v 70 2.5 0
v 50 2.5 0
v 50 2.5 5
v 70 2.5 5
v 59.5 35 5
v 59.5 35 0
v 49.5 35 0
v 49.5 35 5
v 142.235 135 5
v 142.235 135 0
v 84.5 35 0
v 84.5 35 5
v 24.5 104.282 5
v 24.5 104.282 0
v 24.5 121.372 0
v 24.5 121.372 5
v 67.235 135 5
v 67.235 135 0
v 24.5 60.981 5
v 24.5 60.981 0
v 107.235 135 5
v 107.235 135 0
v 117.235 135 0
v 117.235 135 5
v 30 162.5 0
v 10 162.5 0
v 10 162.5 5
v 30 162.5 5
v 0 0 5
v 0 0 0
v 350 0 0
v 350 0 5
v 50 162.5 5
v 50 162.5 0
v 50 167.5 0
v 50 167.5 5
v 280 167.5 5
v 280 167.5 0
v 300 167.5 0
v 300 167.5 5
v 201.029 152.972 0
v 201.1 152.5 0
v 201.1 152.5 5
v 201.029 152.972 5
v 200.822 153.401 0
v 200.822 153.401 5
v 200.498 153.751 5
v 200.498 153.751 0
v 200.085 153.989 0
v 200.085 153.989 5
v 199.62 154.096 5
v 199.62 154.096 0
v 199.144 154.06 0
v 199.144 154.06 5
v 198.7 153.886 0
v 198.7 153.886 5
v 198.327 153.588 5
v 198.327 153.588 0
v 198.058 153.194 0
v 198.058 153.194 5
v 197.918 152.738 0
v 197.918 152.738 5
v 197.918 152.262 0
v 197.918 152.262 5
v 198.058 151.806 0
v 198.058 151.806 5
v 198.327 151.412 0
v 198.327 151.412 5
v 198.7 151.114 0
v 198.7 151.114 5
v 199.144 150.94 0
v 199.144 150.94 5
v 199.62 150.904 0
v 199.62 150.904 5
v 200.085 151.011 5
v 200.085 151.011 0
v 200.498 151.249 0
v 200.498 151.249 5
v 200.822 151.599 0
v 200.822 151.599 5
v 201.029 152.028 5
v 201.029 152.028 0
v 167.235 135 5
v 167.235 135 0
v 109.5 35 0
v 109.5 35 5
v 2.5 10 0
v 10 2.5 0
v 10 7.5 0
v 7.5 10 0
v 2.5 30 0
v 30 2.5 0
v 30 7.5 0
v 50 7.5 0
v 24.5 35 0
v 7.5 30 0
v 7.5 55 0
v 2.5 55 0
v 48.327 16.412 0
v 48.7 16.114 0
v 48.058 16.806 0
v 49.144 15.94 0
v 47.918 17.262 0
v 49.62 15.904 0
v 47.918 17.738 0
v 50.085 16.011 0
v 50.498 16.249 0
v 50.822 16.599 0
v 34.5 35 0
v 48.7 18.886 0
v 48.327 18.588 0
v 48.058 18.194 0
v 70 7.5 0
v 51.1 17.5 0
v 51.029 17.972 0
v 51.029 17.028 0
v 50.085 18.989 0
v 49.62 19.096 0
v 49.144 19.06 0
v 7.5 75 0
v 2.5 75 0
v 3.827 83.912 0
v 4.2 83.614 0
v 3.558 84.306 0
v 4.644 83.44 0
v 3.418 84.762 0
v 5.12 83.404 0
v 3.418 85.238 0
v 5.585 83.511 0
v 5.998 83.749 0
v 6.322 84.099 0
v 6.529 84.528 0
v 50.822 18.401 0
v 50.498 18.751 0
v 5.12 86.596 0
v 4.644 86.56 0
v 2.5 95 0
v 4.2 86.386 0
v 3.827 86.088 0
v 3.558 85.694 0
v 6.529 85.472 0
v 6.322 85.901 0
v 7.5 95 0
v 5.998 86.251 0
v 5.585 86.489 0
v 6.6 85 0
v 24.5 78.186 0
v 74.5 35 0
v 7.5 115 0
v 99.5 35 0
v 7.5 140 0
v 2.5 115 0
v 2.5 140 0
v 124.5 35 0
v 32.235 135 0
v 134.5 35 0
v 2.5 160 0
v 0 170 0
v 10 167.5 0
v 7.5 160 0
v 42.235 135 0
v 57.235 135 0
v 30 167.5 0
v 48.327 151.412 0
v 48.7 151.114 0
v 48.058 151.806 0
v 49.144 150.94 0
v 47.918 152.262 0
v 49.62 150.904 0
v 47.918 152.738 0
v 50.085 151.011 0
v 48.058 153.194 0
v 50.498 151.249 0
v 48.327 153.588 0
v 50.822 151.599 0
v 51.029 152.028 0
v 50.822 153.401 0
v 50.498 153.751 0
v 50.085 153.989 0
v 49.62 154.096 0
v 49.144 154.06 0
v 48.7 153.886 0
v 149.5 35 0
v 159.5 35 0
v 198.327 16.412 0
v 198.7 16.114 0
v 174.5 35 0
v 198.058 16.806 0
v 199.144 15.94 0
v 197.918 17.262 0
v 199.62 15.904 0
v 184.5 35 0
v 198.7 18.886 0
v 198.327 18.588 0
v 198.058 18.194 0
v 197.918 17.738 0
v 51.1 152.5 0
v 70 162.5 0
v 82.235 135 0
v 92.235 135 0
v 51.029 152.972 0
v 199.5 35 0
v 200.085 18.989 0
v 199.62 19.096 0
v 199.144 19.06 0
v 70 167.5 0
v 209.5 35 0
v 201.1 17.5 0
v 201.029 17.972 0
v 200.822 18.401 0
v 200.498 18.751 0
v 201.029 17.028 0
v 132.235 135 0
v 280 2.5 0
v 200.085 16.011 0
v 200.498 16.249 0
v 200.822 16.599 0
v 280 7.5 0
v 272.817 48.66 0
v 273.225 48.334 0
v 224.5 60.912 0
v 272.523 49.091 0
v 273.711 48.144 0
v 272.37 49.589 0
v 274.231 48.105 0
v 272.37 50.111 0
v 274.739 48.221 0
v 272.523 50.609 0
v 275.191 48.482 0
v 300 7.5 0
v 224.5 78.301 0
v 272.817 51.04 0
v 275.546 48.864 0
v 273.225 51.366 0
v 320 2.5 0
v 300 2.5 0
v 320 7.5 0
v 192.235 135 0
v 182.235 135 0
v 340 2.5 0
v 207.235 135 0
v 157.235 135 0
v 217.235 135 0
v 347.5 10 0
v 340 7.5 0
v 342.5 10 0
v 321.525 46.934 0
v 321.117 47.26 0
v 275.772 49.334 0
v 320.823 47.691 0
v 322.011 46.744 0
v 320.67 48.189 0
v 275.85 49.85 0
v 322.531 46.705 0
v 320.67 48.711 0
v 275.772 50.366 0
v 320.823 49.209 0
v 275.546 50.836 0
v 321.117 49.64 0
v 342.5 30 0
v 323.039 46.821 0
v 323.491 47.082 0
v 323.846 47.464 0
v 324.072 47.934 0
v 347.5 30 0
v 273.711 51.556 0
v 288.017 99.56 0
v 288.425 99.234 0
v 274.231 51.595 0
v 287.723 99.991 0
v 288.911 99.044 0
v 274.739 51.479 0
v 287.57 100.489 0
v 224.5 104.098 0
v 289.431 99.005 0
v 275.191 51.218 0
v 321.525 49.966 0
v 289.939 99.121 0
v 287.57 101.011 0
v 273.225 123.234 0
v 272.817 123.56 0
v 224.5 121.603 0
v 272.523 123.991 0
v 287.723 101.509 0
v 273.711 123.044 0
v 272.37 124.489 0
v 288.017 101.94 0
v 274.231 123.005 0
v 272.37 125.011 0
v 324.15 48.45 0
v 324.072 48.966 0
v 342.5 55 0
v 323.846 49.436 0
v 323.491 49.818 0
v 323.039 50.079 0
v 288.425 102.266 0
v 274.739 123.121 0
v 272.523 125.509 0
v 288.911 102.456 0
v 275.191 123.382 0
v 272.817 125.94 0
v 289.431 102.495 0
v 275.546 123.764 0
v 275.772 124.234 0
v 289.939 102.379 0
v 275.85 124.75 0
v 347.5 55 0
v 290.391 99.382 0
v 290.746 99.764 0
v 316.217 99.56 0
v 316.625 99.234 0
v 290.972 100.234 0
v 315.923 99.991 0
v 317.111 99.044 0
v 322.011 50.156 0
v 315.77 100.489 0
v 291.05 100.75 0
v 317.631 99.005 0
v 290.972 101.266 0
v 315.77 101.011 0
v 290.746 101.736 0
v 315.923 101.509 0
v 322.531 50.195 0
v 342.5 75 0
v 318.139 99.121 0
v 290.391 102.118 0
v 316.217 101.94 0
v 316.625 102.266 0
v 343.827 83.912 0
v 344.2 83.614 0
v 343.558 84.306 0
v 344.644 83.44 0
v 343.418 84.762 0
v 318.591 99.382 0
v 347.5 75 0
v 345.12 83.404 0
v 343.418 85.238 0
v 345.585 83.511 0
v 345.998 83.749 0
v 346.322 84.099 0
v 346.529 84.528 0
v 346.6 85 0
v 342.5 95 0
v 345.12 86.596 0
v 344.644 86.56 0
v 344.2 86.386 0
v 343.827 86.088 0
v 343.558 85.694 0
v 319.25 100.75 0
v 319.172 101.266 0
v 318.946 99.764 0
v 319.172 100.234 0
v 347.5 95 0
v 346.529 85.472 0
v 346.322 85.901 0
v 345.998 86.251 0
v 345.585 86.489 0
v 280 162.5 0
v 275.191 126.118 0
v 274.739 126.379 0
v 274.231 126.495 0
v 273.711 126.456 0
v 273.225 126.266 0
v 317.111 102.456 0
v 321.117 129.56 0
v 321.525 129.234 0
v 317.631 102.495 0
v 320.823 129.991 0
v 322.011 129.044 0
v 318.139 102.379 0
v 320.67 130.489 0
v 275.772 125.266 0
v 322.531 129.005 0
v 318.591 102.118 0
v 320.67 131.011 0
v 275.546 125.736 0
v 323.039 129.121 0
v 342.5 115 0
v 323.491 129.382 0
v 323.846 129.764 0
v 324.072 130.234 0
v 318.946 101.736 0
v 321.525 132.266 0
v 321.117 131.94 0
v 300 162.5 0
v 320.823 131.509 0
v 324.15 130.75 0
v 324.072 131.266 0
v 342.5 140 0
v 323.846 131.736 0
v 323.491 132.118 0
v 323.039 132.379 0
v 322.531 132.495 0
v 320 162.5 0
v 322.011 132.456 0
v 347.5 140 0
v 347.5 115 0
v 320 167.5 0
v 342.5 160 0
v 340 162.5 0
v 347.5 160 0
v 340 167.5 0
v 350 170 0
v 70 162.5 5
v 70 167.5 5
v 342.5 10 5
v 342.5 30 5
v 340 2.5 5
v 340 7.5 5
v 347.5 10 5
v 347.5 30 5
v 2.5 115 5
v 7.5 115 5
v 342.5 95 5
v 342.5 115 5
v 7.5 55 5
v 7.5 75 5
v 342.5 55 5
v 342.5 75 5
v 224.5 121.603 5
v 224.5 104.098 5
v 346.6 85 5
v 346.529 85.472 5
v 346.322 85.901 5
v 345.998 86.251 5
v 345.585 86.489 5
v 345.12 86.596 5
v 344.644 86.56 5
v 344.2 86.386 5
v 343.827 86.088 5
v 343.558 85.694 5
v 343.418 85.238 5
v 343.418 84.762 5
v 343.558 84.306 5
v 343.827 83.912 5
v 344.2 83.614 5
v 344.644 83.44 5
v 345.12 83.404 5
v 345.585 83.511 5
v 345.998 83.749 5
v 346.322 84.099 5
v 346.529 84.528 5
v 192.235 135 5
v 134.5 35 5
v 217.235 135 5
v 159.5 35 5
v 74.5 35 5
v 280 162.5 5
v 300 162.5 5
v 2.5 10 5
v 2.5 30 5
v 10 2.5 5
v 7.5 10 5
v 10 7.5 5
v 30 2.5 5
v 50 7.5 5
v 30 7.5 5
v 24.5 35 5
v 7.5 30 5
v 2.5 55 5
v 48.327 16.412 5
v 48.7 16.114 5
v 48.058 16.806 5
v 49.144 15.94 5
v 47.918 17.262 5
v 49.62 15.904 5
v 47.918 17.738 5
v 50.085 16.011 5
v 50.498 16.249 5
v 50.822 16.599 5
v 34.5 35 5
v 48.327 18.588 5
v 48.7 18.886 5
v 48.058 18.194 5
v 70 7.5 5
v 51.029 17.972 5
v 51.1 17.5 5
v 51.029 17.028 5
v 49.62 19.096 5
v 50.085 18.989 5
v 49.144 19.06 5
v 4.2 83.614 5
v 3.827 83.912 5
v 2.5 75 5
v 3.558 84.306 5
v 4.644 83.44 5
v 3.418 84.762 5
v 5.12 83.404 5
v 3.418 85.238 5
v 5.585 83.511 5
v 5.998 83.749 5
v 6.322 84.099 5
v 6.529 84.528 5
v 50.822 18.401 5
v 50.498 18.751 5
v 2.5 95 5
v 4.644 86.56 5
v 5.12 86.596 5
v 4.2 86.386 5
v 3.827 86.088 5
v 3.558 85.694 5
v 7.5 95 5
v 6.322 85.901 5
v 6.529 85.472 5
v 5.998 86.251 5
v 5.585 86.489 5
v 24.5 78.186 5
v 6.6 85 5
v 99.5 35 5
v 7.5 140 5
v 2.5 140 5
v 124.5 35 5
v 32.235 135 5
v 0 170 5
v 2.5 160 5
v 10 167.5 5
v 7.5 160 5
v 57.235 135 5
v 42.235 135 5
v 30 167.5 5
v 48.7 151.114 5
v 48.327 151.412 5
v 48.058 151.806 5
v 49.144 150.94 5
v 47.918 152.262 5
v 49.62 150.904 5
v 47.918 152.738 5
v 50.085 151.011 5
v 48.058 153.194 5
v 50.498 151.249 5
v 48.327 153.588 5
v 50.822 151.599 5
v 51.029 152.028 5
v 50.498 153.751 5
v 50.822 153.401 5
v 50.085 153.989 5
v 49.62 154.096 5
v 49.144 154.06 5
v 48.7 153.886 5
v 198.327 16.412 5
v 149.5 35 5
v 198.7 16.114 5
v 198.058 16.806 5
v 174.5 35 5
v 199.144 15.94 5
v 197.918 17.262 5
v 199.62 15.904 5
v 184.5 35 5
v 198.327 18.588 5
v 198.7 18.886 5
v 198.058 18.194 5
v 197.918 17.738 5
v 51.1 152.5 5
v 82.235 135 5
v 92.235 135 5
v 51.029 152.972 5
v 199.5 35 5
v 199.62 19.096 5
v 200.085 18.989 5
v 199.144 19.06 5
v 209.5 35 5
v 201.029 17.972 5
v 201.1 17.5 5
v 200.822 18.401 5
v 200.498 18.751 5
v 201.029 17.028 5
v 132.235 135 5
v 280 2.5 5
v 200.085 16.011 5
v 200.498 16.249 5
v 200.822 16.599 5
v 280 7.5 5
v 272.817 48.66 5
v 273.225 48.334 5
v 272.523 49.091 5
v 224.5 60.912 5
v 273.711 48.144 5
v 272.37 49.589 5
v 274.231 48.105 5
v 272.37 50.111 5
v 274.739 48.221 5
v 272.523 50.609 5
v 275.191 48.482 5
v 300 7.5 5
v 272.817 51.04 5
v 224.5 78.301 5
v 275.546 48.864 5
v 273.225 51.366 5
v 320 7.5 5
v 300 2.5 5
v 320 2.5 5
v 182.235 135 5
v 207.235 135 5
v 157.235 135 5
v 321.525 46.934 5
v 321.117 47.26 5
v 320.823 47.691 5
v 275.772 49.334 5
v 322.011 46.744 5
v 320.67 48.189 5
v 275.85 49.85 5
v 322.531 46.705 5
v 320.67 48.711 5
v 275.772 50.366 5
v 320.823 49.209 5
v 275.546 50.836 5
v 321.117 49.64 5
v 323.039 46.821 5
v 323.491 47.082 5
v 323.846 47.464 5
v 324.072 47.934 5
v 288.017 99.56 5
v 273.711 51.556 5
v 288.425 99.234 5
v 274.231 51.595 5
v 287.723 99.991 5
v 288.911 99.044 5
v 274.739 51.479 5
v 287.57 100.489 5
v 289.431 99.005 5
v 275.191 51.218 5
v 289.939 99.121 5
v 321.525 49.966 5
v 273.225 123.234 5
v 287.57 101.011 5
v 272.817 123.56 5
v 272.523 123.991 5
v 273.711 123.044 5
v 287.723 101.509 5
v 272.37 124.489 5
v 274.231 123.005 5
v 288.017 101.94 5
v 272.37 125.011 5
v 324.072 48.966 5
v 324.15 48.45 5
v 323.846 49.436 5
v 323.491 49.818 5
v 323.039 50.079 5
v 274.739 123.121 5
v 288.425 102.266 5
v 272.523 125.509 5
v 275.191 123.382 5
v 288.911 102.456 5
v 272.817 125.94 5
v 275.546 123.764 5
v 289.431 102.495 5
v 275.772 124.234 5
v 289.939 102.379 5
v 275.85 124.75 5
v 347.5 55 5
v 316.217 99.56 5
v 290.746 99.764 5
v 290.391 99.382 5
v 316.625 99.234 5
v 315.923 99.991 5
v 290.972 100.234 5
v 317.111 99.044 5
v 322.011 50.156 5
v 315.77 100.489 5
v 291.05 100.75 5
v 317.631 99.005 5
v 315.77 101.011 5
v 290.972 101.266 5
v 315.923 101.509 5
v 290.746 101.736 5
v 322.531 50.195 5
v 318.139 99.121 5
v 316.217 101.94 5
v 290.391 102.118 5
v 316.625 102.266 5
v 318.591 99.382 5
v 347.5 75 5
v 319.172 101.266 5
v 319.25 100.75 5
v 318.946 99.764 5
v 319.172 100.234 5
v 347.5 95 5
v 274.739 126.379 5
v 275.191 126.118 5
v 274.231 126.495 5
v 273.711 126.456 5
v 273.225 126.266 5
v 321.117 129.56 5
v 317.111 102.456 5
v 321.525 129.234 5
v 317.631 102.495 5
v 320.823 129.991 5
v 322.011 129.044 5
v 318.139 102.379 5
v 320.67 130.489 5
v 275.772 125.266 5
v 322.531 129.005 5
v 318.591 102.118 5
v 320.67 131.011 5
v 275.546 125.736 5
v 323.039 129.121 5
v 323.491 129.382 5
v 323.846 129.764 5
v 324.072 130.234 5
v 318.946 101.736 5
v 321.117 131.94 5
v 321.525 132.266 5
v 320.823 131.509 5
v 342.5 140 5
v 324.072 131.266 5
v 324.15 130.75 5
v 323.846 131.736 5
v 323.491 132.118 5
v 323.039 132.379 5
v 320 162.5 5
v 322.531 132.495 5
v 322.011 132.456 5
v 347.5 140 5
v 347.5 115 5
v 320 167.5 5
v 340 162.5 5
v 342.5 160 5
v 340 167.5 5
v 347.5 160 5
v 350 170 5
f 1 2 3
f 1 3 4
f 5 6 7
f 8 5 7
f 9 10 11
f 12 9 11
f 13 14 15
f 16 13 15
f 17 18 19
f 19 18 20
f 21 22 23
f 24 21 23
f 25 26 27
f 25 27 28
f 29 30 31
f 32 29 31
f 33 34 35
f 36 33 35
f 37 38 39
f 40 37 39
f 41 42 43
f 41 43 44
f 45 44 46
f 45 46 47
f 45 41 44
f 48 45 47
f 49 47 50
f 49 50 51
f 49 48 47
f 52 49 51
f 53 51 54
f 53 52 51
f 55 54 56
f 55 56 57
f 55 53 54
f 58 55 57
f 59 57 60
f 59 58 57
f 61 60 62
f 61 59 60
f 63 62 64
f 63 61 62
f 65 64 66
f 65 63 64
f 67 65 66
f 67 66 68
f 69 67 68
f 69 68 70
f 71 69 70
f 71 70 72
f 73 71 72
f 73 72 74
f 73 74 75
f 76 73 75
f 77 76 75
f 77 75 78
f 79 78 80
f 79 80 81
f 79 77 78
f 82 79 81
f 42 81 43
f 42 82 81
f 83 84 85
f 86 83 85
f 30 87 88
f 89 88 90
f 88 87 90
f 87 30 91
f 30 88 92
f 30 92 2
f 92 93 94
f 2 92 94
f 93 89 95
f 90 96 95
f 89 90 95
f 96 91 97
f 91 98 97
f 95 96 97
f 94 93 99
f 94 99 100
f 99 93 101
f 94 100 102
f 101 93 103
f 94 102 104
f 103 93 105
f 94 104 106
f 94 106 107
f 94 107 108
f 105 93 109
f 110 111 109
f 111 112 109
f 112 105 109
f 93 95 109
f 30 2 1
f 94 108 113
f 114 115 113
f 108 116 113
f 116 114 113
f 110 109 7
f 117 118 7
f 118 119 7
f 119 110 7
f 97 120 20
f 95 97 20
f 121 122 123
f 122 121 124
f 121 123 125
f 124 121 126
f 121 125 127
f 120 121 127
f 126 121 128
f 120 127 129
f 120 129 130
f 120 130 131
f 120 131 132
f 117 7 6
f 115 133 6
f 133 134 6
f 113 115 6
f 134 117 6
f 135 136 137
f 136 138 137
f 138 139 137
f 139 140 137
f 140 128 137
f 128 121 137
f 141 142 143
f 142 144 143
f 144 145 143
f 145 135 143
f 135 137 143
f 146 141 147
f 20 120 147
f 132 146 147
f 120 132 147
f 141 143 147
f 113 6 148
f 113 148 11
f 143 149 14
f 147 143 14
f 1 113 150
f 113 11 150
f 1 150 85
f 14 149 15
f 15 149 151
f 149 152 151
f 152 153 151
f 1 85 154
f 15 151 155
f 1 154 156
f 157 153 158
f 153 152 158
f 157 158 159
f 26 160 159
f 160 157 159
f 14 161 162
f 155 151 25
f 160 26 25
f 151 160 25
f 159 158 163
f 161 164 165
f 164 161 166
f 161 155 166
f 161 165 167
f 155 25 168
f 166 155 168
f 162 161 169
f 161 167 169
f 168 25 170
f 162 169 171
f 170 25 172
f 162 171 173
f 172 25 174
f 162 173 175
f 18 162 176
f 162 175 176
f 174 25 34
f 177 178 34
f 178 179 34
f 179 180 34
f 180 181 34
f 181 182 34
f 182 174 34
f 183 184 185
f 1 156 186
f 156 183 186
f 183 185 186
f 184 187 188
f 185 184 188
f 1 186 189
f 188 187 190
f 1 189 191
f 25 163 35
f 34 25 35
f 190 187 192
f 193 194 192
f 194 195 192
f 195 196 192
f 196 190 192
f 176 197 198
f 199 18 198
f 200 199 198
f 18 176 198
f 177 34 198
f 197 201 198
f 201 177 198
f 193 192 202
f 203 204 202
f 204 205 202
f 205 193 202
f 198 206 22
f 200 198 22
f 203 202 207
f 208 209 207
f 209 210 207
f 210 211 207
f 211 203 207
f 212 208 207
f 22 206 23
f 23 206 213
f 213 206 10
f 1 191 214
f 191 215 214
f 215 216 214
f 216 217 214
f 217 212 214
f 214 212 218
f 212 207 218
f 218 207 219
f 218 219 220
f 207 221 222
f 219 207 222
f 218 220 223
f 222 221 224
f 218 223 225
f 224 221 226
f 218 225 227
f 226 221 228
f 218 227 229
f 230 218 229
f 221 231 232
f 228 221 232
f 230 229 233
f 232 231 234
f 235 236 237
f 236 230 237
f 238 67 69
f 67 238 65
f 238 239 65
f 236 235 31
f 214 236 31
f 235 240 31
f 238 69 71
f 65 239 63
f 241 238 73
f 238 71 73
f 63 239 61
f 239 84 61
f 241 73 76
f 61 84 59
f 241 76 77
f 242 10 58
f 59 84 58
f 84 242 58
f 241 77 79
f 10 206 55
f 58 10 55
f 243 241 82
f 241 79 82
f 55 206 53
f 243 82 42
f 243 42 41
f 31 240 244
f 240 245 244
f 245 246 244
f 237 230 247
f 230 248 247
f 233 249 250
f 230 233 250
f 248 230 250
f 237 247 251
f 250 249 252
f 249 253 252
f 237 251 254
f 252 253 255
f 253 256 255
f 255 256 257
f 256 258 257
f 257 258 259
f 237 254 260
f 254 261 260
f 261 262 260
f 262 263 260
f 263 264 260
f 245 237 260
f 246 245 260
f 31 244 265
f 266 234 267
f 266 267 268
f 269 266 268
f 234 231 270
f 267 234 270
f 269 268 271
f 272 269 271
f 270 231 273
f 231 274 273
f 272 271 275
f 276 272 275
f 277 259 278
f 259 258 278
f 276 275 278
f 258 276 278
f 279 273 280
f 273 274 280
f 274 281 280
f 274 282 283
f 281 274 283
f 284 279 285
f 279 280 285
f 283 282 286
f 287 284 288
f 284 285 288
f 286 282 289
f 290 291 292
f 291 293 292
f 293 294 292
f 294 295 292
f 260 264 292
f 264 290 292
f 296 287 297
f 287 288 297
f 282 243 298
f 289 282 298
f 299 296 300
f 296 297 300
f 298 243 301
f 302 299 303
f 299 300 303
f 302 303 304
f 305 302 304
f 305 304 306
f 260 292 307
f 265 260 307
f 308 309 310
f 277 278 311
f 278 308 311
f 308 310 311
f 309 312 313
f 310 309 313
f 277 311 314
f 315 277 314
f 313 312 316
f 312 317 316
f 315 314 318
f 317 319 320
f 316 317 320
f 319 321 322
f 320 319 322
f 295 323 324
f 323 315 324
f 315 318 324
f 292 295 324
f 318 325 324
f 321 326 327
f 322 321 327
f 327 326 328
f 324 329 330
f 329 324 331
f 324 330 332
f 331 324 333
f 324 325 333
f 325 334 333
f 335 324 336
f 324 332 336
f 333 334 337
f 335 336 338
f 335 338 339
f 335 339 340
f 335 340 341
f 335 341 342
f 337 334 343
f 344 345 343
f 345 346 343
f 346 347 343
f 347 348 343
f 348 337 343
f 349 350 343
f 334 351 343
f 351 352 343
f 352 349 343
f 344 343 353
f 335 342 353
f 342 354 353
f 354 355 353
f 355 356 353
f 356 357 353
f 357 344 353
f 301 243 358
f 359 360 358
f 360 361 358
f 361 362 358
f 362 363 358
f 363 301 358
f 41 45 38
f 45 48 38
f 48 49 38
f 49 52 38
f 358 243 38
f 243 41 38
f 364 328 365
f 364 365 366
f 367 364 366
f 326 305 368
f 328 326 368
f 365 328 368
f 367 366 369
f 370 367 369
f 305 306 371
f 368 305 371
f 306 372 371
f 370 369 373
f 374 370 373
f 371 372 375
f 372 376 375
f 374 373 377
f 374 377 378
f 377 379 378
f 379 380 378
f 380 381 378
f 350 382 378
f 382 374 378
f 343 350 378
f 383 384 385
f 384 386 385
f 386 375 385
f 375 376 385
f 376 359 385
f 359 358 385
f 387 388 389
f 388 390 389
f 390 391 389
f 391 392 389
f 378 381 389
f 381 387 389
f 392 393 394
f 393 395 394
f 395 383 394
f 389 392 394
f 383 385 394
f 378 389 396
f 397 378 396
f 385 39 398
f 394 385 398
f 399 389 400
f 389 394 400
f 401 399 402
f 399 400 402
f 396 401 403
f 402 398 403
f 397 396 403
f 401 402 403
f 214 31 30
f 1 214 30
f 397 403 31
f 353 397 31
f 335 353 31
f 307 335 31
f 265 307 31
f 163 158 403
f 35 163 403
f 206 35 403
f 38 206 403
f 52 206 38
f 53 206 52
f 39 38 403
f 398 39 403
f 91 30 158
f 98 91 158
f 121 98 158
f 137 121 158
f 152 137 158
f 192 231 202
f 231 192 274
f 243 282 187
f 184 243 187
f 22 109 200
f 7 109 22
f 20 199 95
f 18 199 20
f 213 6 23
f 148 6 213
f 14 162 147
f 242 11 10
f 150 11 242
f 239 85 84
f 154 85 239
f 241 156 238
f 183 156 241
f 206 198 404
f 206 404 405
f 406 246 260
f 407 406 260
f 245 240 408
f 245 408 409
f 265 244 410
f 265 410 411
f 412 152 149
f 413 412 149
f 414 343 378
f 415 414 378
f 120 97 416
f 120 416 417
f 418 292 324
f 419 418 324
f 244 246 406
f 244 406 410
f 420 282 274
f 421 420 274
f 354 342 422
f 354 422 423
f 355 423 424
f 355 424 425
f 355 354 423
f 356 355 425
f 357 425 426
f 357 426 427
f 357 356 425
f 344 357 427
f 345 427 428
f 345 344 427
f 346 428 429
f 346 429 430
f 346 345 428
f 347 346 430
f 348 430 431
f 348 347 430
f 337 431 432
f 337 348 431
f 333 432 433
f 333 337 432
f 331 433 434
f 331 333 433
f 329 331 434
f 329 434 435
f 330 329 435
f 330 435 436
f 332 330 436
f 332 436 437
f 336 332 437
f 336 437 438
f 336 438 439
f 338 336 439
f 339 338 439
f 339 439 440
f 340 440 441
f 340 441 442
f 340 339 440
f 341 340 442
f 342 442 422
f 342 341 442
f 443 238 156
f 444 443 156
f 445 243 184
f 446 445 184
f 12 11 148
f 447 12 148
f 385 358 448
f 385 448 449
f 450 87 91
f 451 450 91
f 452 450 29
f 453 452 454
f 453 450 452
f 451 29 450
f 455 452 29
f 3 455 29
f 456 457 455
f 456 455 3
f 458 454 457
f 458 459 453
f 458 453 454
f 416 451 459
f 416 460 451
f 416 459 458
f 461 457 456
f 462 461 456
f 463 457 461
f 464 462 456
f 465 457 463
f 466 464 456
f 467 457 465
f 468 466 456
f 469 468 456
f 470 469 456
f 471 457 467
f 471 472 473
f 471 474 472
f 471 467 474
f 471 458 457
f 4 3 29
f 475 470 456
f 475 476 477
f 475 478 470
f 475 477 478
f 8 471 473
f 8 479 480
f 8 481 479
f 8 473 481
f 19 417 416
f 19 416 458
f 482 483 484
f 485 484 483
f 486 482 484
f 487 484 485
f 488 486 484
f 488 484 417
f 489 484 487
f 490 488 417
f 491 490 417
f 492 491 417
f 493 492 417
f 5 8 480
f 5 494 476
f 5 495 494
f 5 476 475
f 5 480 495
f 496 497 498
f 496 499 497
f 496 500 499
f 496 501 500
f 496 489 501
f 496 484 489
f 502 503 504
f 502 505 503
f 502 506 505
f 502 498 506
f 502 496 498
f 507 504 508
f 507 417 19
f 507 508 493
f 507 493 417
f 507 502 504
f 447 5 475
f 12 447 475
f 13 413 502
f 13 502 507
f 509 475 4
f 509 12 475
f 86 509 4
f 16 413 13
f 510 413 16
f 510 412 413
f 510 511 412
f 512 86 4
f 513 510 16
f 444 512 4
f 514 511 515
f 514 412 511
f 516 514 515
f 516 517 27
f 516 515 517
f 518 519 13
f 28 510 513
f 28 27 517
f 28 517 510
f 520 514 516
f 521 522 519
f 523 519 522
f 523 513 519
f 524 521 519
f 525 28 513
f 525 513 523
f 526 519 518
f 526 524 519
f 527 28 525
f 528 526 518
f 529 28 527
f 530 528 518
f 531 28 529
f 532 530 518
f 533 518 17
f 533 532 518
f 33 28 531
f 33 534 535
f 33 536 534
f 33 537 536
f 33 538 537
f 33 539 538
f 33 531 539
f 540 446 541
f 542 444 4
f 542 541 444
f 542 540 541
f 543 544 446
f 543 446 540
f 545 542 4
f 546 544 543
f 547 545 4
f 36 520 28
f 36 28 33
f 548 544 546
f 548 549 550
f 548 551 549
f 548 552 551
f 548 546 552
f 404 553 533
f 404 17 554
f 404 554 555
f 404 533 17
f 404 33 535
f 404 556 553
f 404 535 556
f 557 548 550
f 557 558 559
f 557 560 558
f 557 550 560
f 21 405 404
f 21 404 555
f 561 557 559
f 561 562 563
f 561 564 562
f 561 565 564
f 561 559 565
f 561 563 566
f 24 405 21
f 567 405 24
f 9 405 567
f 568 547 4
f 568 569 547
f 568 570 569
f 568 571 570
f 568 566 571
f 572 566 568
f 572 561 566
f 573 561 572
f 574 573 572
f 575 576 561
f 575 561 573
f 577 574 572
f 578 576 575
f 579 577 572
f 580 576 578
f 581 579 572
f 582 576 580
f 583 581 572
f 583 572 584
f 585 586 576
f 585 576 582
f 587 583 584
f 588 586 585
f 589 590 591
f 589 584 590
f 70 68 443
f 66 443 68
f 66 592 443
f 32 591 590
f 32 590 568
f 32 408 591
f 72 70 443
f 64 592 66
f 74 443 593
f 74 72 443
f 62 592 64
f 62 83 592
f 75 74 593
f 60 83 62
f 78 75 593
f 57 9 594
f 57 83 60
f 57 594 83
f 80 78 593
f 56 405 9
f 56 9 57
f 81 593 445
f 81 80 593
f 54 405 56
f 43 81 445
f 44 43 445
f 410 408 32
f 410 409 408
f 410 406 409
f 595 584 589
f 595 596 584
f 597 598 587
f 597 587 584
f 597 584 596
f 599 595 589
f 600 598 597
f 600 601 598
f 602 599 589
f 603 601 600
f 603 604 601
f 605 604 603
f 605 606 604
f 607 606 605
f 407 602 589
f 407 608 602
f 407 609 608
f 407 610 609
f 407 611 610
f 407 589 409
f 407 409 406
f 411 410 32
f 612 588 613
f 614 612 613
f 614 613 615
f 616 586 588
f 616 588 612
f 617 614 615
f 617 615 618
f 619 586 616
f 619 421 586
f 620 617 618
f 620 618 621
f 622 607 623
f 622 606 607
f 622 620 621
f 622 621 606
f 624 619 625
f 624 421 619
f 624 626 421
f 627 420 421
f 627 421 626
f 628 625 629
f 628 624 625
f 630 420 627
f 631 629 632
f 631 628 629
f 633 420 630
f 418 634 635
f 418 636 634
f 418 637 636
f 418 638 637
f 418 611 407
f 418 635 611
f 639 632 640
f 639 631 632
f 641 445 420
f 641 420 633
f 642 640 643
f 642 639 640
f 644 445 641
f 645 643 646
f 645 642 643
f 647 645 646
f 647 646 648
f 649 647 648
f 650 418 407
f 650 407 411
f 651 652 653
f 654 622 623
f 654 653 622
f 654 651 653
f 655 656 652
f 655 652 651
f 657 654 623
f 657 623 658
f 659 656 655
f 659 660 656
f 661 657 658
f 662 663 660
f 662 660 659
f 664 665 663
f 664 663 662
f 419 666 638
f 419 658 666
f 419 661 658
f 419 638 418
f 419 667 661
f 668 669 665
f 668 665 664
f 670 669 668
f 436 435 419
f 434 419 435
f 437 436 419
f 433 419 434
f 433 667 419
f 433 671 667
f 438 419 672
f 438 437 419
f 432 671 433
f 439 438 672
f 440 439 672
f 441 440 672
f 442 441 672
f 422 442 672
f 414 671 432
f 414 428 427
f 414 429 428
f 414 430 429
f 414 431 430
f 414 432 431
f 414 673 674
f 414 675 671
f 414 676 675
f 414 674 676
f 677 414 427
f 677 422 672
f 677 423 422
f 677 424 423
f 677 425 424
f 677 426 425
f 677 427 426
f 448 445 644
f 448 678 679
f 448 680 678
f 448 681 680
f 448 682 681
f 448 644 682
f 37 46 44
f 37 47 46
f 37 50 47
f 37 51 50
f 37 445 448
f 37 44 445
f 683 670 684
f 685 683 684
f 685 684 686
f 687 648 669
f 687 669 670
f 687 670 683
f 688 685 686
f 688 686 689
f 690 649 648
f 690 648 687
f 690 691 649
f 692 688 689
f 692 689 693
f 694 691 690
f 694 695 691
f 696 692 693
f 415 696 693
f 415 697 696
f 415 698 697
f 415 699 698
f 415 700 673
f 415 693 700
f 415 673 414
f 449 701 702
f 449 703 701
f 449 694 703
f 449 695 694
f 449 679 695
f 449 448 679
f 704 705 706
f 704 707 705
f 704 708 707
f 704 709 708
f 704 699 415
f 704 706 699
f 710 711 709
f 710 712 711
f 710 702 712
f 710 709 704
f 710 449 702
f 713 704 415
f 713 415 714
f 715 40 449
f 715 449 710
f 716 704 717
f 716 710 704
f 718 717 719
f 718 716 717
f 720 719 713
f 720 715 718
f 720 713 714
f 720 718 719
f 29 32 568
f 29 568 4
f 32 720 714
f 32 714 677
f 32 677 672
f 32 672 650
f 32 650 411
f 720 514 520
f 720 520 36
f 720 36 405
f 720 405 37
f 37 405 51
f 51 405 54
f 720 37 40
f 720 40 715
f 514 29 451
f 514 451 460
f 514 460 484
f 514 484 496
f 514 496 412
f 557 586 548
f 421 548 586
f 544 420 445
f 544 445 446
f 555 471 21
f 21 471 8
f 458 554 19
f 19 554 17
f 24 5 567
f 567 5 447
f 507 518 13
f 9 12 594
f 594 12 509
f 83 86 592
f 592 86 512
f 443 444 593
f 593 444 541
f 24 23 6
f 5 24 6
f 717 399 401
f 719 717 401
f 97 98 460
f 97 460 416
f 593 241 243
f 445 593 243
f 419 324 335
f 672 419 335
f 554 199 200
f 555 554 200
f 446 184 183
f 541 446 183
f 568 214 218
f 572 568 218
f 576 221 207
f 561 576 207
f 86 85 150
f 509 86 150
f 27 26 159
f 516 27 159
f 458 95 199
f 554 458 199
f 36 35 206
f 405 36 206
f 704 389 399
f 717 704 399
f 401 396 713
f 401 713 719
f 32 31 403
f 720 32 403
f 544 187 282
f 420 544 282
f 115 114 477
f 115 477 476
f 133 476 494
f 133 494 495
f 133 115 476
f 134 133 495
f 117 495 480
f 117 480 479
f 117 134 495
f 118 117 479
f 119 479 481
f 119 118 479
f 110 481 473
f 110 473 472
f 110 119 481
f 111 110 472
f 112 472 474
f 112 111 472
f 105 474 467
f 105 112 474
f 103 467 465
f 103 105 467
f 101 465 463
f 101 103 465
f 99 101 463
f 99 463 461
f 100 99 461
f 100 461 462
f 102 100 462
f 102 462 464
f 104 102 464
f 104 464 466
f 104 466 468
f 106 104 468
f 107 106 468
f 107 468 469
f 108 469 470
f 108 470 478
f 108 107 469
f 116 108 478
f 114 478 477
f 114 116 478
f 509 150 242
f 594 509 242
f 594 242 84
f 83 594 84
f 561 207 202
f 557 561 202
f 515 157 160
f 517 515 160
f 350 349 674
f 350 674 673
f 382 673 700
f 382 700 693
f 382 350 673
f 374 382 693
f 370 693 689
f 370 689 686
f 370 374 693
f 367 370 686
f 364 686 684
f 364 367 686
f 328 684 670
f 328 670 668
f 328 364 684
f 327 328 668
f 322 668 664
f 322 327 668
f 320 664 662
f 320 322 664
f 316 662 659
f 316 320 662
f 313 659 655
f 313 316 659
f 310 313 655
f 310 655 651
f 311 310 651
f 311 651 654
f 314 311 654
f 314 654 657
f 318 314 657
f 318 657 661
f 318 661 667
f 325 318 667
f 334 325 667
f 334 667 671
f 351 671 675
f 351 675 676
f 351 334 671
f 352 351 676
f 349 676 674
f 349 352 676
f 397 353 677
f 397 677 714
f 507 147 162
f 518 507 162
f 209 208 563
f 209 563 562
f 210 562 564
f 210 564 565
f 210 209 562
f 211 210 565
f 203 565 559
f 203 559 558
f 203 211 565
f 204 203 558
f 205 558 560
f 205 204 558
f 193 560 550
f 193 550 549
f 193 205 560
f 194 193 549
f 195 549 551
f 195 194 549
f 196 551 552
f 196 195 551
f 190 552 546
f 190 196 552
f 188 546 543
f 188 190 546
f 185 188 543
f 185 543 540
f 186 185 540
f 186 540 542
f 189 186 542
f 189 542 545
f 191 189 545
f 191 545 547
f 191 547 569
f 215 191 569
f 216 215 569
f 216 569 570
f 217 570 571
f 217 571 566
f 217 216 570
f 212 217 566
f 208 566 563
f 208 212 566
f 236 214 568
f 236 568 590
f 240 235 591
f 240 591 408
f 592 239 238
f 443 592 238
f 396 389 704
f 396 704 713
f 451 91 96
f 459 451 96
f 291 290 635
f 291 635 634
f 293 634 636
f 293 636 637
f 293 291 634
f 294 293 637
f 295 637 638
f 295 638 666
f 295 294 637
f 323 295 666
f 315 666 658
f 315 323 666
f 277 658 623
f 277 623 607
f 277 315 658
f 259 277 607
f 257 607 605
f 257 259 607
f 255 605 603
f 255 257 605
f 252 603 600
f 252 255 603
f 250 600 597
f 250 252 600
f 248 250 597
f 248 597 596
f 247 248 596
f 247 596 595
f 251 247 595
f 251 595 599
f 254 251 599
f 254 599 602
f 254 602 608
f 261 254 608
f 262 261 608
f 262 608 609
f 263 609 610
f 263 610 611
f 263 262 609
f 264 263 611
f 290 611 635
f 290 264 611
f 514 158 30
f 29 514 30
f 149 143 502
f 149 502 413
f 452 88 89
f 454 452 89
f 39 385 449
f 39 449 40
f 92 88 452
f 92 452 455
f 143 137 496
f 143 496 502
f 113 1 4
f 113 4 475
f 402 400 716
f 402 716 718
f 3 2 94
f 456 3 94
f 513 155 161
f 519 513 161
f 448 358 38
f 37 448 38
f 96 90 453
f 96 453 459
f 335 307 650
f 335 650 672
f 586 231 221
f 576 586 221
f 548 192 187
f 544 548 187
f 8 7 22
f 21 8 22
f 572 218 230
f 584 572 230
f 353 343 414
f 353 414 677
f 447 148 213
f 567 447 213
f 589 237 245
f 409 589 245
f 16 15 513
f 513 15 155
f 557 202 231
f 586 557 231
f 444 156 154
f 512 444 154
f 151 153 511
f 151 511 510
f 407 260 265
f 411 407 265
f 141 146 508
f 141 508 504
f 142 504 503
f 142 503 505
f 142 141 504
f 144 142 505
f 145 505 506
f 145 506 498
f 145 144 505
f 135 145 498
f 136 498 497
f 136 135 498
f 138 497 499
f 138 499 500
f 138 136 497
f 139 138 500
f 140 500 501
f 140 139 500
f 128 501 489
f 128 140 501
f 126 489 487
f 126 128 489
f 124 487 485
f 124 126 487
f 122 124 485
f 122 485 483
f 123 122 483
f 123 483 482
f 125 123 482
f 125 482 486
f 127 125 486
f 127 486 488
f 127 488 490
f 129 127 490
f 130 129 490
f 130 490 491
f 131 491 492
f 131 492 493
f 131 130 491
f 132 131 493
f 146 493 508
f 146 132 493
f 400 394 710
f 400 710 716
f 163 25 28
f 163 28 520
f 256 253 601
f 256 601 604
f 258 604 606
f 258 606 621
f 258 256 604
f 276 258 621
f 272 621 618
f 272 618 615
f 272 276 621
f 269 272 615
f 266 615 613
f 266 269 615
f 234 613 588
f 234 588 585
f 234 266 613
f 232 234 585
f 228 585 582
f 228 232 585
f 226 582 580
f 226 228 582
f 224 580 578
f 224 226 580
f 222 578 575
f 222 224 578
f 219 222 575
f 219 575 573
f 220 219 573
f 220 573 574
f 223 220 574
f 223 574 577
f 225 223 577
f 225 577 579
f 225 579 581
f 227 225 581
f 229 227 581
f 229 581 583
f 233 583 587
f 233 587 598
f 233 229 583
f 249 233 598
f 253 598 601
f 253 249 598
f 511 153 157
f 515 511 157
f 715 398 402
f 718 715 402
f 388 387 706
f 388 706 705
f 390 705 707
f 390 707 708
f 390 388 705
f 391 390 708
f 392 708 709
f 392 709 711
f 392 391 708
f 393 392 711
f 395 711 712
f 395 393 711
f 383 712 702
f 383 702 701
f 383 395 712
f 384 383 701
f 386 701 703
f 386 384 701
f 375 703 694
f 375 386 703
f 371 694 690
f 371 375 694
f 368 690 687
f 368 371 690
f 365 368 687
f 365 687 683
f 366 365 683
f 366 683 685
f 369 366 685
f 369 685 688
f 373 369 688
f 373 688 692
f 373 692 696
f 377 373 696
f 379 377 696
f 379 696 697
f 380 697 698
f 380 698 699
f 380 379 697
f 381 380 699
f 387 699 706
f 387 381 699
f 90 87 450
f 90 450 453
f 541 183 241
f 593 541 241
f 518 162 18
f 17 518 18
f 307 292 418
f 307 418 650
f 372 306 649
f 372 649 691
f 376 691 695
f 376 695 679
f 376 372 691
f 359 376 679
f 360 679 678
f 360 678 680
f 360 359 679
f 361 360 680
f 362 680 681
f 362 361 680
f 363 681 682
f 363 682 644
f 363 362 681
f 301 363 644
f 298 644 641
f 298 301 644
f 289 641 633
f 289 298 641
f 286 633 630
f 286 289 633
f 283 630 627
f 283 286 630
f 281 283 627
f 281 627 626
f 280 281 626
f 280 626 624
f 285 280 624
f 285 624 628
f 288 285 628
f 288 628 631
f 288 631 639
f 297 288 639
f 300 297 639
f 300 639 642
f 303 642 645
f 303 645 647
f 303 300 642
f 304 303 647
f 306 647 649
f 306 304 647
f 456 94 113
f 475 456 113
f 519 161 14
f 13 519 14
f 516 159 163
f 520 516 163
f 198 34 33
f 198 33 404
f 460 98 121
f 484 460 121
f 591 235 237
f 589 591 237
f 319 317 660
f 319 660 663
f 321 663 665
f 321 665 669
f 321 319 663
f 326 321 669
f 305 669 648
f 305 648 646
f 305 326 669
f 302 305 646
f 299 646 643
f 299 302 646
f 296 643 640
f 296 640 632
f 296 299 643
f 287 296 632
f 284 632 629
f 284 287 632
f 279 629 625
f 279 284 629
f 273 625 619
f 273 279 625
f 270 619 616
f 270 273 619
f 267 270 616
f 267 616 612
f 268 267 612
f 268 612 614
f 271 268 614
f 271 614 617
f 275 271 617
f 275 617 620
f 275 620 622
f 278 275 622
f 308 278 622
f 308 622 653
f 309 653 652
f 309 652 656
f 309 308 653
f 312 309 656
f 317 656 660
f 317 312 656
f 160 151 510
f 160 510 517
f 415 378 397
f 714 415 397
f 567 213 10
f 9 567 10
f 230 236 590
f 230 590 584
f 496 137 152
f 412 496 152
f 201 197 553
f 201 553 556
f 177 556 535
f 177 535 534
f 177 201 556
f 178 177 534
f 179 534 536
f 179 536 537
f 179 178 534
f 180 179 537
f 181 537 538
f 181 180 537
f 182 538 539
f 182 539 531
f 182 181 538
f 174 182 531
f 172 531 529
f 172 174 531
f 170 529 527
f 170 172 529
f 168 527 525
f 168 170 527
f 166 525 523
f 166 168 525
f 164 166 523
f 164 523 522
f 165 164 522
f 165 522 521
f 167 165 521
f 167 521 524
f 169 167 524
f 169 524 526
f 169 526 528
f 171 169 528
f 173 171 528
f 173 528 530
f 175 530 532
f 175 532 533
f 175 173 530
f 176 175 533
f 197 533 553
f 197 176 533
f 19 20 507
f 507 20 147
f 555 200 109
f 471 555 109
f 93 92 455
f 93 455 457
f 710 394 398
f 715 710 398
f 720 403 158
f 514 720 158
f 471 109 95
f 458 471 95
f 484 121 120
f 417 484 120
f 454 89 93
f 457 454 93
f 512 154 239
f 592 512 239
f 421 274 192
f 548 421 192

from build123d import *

# Parameters (mm, degrees)
F1_W     = 20
F1_H     = 5
F1_W_2   = 5
F1_H_2   = 20
F1_R     = 1.6
F1_R_2   = 1.75
F2_DEPTH = 5


with BuildPart() as f2:
    # F1 (on Top) → F2 (new body)
    with BuildSketch(Plane.XY):
        Polygon((0, 35), (0, 0), (350, 0), (350, 170), (0, 170), align=None)
        with Locations((20, 5)):
            Rectangle(F1_W, F1_H, mode=Mode.SUBTRACT)
        with Locations((5, 20)):
            Rectangle(F1_W_2, F1_H_2, mode=Mode.SUBTRACT)
        with Locations((60, 5)):
            Rectangle(F1_W, F1_H, mode=Mode.SUBTRACT)
        with Locations((49.5, 17.5)):
            Circle(F1_R, mode=Mode.SUBTRACT)
        with Locations((5, 65)):
            Rectangle(F1_W_2, F1_H_2, mode=Mode.SUBTRACT)
        with Locations((199.5, 17.5)):
            Circle(F1_R, mode=Mode.SUBTRACT)
        with Locations((290, 5)):
            Rectangle(F1_W, F1_H, mode=Mode.SUBTRACT)
        with Locations((330, 5)):
            Rectangle(F1_W, F1_H, mode=Mode.SUBTRACT)
        with Locations((345, 20)):
            Rectangle(F1_W_2, F1_H_2, mode=Mode.SUBTRACT)
        Polygon((209.5, 35), (199.5, 35), (224.5, 78.3012701892), (224.5, 60.9117498708), align=None, mode=Mode.SUBTRACT)
        Polygon((184.5, 35), (174.5, 35), (224.5, 121.6025403784), (224.5, 104.0979996554), align=None, mode=Mode.SUBTRACT)
        with Locations((274.1, 49.85)):
            Circle(F1_R_2, mode=Mode.SUBTRACT)
        with Locations((322.4, 48.45)):
            Circle(F1_R_2, mode=Mode.SUBTRACT)
        with Locations((345, 65)):
            Rectangle(F1_W_2, F1_H_2, mode=Mode.SUBTRACT)
        with Locations((5, 85)):
            Circle(F1_R, mode=Mode.SUBTRACT)
        with Locations((5, 105)):
            Rectangle(F1_W_2, F1_H_2, mode=Mode.SUBTRACT)
        Polygon((34.5, 35), (24.5, 35), (82.235026919, 135), (92.235026919, 135), align=None, mode=Mode.SUBTRACT)
        Polygon((59.5, 35), (49.5, 35), (107.235026919, 135), (117.235026919, 135), align=None, mode=Mode.SUBTRACT)
        Polygon((57.235026919, 135), (67.235026919, 135), (24.5, 60.9807621135), (24.5, 78.1862497847), align=None, mode=Mode.SUBTRACT)
        Polygon((32.235026919, 135), (42.235026919, 135), (24.5, 104.2820323028), (24.5, 121.3724995693), align=None, mode=Mode.SUBTRACT)
        Polygon((84.5, 35), (74.5, 35), (132.235026919, 135), (142.235026919, 135), align=None, mode=Mode.SUBTRACT)
        Polygon((109.5, 35), (99.5, 35), (157.235026919, 135), (167.235026919, 135), align=None, mode=Mode.SUBTRACT)
        Polygon((134.5, 35), (124.5, 35), (182.235026919, 135), (192.235026919, 135), align=None, mode=Mode.SUBTRACT)
        with Locations((5, 150)):
            Rectangle(F1_W_2, F1_H_2, mode=Mode.SUBTRACT)
        with Locations((20, 165)):
            Rectangle(F1_W, F1_H, mode=Mode.SUBTRACT)
        with Locations((49.5, 152.5)):
            Circle(F1_R, mode=Mode.SUBTRACT)
        with Locations((60, 165)):
            Rectangle(F1_W, F1_H, mode=Mode.SUBTRACT)
        Polygon((159.5, 35), (149.5, 35), (207.235026919, 135), (217.235026919, 135), align=None, mode=Mode.SUBTRACT)
        with Locations((289.3, 100.75)):
            Circle(F1_R_2, mode=Mode.SUBTRACT)
        with Locations((345, 85)):
            Circle(F1_R, mode=Mode.SUBTRACT)
        with Locations((317.5, 100.75)):
            Circle(F1_R_2, mode=Mode.SUBTRACT)
        with Locations((345, 105)):
            Rectangle(F1_W_2, F1_H_2, mode=Mode.SUBTRACT)
        with Locations((274.1, 124.75)):
            Circle(F1_R_2, mode=Mode.SUBTRACT)
        with Locations((199.5, 152.5)):
            Circle(F1_R, mode=Mode.SUBTRACT)
        with Locations((322.4, 130.75)):
            Circle(F1_R_2, mode=Mode.SUBTRACT)
        with Locations((290, 165)):
            Rectangle(F1_W, F1_H, mode=Mode.SUBTRACT)
        with Locations((345, 150)):
            Rectangle(F1_W_2, F1_H_2, mode=Mode.SUBTRACT)
        with Locations((330, 165)):
            Rectangle(F1_W, F1_H, mode=Mode.SUBTRACT)
    extrude(amount=F2_DEPTH)


solid = f2.part
